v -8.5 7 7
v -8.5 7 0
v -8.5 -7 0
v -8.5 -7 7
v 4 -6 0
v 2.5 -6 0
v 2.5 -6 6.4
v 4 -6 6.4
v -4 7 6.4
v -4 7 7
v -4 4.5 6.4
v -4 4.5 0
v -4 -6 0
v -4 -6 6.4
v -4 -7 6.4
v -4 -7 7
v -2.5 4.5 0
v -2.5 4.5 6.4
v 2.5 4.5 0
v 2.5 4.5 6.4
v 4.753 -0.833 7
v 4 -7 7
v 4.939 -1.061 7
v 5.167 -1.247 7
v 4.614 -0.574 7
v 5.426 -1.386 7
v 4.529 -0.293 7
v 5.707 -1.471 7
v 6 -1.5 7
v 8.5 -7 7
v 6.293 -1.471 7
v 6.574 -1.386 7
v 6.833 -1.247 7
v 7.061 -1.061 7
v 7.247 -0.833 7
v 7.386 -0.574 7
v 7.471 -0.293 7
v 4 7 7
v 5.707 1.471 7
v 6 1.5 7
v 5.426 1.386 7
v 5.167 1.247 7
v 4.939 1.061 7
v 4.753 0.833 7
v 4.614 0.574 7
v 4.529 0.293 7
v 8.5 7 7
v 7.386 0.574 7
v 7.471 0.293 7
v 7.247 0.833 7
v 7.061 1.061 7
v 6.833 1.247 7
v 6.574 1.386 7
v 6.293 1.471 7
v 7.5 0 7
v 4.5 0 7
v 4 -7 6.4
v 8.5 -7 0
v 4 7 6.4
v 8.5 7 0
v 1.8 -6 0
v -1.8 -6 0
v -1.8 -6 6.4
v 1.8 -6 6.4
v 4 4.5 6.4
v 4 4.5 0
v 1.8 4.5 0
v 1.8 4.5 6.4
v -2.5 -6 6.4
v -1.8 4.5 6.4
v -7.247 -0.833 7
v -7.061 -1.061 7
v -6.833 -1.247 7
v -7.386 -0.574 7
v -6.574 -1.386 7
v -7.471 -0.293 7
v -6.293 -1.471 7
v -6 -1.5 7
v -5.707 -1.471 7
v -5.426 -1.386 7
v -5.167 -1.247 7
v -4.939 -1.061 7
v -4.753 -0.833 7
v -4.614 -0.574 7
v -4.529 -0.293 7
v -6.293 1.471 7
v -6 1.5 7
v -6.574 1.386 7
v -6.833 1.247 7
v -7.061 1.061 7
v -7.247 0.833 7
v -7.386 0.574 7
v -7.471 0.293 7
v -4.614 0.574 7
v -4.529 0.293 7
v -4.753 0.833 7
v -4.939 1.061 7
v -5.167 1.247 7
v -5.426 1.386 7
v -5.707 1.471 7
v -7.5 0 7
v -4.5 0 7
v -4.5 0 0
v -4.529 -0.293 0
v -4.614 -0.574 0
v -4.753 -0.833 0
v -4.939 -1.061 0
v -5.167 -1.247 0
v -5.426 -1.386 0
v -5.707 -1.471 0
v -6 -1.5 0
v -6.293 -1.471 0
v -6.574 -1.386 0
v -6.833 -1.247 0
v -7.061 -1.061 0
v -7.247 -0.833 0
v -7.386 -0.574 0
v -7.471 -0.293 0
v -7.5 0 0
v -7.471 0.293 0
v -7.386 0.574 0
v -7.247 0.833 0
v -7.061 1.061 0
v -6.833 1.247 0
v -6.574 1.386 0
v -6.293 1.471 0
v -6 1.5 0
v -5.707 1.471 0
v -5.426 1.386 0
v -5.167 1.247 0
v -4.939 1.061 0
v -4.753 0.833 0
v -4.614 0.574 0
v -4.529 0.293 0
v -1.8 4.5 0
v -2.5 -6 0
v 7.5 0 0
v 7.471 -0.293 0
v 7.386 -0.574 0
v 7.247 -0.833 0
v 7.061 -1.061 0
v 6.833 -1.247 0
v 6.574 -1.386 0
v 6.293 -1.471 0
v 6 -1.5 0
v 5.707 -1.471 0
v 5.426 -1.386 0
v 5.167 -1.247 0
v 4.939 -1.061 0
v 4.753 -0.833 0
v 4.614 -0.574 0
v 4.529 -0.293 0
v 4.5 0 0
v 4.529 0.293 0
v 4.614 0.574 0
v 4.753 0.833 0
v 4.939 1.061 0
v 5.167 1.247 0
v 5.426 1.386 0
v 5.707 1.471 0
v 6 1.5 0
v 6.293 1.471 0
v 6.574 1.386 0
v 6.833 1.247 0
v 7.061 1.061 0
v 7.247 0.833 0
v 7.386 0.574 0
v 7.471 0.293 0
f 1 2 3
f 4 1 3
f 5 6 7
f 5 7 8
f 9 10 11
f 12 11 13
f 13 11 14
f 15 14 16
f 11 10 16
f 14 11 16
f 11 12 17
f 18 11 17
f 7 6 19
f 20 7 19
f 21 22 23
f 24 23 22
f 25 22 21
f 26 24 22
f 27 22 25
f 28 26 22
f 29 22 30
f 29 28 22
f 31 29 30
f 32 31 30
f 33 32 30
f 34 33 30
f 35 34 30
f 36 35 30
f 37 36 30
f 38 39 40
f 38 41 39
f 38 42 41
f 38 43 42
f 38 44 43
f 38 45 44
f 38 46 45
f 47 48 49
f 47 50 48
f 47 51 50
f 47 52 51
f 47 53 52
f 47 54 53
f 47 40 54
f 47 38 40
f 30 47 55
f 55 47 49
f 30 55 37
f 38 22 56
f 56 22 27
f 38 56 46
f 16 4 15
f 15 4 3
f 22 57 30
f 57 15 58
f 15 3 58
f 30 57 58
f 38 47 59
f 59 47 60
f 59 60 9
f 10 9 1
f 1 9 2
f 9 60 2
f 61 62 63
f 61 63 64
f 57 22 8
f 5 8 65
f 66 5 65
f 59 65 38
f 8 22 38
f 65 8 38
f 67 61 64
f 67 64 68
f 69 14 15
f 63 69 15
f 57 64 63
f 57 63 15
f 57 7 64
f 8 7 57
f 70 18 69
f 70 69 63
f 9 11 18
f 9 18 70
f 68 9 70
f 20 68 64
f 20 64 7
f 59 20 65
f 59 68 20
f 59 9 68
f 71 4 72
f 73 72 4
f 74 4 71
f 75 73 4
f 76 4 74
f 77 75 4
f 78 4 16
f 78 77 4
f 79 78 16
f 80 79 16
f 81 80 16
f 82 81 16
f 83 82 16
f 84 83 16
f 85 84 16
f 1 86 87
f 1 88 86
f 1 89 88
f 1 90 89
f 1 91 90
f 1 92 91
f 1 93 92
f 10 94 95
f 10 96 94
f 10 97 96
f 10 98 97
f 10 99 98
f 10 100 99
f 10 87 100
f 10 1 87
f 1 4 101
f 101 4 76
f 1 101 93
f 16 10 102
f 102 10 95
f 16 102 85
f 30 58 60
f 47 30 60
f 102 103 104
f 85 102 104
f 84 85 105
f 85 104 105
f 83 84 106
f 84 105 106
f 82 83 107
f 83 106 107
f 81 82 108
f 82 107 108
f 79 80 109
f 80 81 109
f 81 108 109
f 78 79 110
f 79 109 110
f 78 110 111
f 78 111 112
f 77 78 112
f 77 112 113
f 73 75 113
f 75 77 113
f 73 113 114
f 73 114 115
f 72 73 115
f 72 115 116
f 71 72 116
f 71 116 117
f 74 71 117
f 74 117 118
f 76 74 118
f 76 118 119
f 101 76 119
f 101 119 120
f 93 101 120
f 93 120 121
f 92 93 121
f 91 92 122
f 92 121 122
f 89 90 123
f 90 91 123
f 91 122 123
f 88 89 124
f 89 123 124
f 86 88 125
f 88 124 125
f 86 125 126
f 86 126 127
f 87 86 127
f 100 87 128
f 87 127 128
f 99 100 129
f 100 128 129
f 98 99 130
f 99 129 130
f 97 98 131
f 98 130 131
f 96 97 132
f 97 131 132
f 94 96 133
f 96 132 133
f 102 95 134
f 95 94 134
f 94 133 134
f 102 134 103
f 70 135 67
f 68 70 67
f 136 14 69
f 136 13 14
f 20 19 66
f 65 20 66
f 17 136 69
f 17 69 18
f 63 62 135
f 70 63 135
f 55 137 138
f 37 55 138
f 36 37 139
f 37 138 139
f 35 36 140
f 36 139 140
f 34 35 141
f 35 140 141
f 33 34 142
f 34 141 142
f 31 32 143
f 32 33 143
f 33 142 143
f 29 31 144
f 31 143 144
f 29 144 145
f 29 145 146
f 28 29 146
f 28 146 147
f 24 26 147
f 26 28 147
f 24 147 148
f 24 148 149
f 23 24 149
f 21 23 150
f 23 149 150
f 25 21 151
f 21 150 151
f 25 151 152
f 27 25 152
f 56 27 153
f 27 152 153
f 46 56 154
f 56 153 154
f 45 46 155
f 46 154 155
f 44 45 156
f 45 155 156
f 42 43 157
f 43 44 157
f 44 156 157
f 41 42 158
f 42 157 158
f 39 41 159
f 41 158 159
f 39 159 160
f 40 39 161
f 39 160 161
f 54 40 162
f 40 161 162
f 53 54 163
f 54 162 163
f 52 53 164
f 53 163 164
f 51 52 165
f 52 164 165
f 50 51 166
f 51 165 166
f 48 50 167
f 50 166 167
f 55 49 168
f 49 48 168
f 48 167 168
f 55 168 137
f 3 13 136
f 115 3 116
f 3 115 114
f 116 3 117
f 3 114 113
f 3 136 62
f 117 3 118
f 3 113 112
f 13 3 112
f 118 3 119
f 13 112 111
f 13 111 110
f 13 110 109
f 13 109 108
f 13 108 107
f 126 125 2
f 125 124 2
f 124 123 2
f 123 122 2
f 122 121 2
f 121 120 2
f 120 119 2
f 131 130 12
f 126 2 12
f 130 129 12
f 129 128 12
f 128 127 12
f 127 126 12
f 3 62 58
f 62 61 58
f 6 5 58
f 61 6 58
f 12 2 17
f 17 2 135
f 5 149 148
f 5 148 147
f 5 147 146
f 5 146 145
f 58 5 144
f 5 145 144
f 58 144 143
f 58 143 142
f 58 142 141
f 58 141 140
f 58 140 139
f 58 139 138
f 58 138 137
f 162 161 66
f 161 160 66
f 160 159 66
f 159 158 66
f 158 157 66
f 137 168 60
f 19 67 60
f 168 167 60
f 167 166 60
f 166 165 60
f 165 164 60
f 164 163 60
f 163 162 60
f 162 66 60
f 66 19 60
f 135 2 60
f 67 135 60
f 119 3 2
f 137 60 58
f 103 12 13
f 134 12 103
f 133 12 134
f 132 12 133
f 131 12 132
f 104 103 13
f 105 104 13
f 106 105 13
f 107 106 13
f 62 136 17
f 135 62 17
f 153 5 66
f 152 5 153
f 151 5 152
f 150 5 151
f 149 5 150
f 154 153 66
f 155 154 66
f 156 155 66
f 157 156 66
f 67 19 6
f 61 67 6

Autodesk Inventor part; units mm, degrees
ref_plane "YZ Plane" through (0, 0, 0) normal (1, 0, 0) x (0, 1, 0)
ref_plane "XZ Plane" through (0, 0, 0) normal (0, 1, 0) x (-1, 0, 0)
ref_plane "XY Plane" through (0, 0, 0) normal (0, 0, 1) x (1, 0, 0)
sketch "スケッチ1" plane through (0, 0, 0) normal (0, 0, 1) x (1, 0, 0)
  line L0 (8.5, 7) -> (-8.5, 7)
  line L1 (-8.5, 7) -> (-8.5, -7)
  line L2 (-8.5, -7) -> (8.5, -7)
  line L3 (8.5, -7) -> (8.5, 7)
  line L4 (8.5, 7) -> (-8.5, -7) construction
  line L5 (-8.5, 7) -> (8.5, -7) construction
  circle A0 centre (-6, 0) radius 1.5
  circle A1 centre (6, 0) radius 1.5
  line L6 (-8.5, -6) -> (8.5, -6)
  line L7 (-8.5, 4.5) -> (8.5, 4.5)
  line L8 (-4, -7) -> (-4, 7)
  line L9 (4, -7) -> (4, 7)
  line L10 (2.5, -6) -> (2.5, 4.5)
  line L11 (-2.5, -6) -> (-2.5, 4.5)
  line L12 (1.8, -6) -> (1.8, 4.5)
  line L13 (-1.8, -6) -> (-1.8, 4.5)
  point P0 (0, 0)
  point P1 (-4, -6)
  point P2 (-4, 4.5)
  point P3 (4, -6)
  point P4 (4, 4.5)
  dimension "d0" = 17
  dimension "d1" = 14
  dimension "d2" = 3
  dimension "d3" = 3
  dimension "d4" = 2.5
  dimension "d5" = 4.5
  dimension "d6" = 4.5
  dimension "d7" = 1.5
  dimension "d8" = 1.5
  dimension "d9" = 1
  dimension "d16" = 0.7
  dimension "d17" = 0.7
extrude "押し出し1" add sketch "スケッチ1" along normal blind 7 contours L3 L7 L9 L0 | L9 L7 L8 L0 | L3 L6 L9 L7 | L8 L7 L1 L0 | L3 L2 L9 L6 | L8 L6 L1 L7 | L10 L6 L12 L7 | L9 L2 L8 L6 | L7 L13 L6 L11 | L8 L2 L1 L6
sketch "スケッチ2" plane through (0, 0, 7) normal (0, 0, 1) x (1, 0, 0)
  line L0 (8.5, 7) -> (-8.5, 7) projected
  line L1 (0, 7) -> (-4, 7)
  line L2 (-4, 7) -> (-4, -7)
  line L3 (-8.5, -7) -> (8.5, -7) projected
  line L4 (-4, -7) -> (4, -7)
  line L5 (4, -7) -> (4, 7)
  line L6 (4, 7) -> (0, 7)
  point P0 (0, 0)
  dimension "d12" = 4
  dimension "d13" = 8
extrude "押し出し2" cut sketch "スケッチ2" against normal blind 0.6
properties part number "greiper_TPU" material "ゴム、シリコーン"
